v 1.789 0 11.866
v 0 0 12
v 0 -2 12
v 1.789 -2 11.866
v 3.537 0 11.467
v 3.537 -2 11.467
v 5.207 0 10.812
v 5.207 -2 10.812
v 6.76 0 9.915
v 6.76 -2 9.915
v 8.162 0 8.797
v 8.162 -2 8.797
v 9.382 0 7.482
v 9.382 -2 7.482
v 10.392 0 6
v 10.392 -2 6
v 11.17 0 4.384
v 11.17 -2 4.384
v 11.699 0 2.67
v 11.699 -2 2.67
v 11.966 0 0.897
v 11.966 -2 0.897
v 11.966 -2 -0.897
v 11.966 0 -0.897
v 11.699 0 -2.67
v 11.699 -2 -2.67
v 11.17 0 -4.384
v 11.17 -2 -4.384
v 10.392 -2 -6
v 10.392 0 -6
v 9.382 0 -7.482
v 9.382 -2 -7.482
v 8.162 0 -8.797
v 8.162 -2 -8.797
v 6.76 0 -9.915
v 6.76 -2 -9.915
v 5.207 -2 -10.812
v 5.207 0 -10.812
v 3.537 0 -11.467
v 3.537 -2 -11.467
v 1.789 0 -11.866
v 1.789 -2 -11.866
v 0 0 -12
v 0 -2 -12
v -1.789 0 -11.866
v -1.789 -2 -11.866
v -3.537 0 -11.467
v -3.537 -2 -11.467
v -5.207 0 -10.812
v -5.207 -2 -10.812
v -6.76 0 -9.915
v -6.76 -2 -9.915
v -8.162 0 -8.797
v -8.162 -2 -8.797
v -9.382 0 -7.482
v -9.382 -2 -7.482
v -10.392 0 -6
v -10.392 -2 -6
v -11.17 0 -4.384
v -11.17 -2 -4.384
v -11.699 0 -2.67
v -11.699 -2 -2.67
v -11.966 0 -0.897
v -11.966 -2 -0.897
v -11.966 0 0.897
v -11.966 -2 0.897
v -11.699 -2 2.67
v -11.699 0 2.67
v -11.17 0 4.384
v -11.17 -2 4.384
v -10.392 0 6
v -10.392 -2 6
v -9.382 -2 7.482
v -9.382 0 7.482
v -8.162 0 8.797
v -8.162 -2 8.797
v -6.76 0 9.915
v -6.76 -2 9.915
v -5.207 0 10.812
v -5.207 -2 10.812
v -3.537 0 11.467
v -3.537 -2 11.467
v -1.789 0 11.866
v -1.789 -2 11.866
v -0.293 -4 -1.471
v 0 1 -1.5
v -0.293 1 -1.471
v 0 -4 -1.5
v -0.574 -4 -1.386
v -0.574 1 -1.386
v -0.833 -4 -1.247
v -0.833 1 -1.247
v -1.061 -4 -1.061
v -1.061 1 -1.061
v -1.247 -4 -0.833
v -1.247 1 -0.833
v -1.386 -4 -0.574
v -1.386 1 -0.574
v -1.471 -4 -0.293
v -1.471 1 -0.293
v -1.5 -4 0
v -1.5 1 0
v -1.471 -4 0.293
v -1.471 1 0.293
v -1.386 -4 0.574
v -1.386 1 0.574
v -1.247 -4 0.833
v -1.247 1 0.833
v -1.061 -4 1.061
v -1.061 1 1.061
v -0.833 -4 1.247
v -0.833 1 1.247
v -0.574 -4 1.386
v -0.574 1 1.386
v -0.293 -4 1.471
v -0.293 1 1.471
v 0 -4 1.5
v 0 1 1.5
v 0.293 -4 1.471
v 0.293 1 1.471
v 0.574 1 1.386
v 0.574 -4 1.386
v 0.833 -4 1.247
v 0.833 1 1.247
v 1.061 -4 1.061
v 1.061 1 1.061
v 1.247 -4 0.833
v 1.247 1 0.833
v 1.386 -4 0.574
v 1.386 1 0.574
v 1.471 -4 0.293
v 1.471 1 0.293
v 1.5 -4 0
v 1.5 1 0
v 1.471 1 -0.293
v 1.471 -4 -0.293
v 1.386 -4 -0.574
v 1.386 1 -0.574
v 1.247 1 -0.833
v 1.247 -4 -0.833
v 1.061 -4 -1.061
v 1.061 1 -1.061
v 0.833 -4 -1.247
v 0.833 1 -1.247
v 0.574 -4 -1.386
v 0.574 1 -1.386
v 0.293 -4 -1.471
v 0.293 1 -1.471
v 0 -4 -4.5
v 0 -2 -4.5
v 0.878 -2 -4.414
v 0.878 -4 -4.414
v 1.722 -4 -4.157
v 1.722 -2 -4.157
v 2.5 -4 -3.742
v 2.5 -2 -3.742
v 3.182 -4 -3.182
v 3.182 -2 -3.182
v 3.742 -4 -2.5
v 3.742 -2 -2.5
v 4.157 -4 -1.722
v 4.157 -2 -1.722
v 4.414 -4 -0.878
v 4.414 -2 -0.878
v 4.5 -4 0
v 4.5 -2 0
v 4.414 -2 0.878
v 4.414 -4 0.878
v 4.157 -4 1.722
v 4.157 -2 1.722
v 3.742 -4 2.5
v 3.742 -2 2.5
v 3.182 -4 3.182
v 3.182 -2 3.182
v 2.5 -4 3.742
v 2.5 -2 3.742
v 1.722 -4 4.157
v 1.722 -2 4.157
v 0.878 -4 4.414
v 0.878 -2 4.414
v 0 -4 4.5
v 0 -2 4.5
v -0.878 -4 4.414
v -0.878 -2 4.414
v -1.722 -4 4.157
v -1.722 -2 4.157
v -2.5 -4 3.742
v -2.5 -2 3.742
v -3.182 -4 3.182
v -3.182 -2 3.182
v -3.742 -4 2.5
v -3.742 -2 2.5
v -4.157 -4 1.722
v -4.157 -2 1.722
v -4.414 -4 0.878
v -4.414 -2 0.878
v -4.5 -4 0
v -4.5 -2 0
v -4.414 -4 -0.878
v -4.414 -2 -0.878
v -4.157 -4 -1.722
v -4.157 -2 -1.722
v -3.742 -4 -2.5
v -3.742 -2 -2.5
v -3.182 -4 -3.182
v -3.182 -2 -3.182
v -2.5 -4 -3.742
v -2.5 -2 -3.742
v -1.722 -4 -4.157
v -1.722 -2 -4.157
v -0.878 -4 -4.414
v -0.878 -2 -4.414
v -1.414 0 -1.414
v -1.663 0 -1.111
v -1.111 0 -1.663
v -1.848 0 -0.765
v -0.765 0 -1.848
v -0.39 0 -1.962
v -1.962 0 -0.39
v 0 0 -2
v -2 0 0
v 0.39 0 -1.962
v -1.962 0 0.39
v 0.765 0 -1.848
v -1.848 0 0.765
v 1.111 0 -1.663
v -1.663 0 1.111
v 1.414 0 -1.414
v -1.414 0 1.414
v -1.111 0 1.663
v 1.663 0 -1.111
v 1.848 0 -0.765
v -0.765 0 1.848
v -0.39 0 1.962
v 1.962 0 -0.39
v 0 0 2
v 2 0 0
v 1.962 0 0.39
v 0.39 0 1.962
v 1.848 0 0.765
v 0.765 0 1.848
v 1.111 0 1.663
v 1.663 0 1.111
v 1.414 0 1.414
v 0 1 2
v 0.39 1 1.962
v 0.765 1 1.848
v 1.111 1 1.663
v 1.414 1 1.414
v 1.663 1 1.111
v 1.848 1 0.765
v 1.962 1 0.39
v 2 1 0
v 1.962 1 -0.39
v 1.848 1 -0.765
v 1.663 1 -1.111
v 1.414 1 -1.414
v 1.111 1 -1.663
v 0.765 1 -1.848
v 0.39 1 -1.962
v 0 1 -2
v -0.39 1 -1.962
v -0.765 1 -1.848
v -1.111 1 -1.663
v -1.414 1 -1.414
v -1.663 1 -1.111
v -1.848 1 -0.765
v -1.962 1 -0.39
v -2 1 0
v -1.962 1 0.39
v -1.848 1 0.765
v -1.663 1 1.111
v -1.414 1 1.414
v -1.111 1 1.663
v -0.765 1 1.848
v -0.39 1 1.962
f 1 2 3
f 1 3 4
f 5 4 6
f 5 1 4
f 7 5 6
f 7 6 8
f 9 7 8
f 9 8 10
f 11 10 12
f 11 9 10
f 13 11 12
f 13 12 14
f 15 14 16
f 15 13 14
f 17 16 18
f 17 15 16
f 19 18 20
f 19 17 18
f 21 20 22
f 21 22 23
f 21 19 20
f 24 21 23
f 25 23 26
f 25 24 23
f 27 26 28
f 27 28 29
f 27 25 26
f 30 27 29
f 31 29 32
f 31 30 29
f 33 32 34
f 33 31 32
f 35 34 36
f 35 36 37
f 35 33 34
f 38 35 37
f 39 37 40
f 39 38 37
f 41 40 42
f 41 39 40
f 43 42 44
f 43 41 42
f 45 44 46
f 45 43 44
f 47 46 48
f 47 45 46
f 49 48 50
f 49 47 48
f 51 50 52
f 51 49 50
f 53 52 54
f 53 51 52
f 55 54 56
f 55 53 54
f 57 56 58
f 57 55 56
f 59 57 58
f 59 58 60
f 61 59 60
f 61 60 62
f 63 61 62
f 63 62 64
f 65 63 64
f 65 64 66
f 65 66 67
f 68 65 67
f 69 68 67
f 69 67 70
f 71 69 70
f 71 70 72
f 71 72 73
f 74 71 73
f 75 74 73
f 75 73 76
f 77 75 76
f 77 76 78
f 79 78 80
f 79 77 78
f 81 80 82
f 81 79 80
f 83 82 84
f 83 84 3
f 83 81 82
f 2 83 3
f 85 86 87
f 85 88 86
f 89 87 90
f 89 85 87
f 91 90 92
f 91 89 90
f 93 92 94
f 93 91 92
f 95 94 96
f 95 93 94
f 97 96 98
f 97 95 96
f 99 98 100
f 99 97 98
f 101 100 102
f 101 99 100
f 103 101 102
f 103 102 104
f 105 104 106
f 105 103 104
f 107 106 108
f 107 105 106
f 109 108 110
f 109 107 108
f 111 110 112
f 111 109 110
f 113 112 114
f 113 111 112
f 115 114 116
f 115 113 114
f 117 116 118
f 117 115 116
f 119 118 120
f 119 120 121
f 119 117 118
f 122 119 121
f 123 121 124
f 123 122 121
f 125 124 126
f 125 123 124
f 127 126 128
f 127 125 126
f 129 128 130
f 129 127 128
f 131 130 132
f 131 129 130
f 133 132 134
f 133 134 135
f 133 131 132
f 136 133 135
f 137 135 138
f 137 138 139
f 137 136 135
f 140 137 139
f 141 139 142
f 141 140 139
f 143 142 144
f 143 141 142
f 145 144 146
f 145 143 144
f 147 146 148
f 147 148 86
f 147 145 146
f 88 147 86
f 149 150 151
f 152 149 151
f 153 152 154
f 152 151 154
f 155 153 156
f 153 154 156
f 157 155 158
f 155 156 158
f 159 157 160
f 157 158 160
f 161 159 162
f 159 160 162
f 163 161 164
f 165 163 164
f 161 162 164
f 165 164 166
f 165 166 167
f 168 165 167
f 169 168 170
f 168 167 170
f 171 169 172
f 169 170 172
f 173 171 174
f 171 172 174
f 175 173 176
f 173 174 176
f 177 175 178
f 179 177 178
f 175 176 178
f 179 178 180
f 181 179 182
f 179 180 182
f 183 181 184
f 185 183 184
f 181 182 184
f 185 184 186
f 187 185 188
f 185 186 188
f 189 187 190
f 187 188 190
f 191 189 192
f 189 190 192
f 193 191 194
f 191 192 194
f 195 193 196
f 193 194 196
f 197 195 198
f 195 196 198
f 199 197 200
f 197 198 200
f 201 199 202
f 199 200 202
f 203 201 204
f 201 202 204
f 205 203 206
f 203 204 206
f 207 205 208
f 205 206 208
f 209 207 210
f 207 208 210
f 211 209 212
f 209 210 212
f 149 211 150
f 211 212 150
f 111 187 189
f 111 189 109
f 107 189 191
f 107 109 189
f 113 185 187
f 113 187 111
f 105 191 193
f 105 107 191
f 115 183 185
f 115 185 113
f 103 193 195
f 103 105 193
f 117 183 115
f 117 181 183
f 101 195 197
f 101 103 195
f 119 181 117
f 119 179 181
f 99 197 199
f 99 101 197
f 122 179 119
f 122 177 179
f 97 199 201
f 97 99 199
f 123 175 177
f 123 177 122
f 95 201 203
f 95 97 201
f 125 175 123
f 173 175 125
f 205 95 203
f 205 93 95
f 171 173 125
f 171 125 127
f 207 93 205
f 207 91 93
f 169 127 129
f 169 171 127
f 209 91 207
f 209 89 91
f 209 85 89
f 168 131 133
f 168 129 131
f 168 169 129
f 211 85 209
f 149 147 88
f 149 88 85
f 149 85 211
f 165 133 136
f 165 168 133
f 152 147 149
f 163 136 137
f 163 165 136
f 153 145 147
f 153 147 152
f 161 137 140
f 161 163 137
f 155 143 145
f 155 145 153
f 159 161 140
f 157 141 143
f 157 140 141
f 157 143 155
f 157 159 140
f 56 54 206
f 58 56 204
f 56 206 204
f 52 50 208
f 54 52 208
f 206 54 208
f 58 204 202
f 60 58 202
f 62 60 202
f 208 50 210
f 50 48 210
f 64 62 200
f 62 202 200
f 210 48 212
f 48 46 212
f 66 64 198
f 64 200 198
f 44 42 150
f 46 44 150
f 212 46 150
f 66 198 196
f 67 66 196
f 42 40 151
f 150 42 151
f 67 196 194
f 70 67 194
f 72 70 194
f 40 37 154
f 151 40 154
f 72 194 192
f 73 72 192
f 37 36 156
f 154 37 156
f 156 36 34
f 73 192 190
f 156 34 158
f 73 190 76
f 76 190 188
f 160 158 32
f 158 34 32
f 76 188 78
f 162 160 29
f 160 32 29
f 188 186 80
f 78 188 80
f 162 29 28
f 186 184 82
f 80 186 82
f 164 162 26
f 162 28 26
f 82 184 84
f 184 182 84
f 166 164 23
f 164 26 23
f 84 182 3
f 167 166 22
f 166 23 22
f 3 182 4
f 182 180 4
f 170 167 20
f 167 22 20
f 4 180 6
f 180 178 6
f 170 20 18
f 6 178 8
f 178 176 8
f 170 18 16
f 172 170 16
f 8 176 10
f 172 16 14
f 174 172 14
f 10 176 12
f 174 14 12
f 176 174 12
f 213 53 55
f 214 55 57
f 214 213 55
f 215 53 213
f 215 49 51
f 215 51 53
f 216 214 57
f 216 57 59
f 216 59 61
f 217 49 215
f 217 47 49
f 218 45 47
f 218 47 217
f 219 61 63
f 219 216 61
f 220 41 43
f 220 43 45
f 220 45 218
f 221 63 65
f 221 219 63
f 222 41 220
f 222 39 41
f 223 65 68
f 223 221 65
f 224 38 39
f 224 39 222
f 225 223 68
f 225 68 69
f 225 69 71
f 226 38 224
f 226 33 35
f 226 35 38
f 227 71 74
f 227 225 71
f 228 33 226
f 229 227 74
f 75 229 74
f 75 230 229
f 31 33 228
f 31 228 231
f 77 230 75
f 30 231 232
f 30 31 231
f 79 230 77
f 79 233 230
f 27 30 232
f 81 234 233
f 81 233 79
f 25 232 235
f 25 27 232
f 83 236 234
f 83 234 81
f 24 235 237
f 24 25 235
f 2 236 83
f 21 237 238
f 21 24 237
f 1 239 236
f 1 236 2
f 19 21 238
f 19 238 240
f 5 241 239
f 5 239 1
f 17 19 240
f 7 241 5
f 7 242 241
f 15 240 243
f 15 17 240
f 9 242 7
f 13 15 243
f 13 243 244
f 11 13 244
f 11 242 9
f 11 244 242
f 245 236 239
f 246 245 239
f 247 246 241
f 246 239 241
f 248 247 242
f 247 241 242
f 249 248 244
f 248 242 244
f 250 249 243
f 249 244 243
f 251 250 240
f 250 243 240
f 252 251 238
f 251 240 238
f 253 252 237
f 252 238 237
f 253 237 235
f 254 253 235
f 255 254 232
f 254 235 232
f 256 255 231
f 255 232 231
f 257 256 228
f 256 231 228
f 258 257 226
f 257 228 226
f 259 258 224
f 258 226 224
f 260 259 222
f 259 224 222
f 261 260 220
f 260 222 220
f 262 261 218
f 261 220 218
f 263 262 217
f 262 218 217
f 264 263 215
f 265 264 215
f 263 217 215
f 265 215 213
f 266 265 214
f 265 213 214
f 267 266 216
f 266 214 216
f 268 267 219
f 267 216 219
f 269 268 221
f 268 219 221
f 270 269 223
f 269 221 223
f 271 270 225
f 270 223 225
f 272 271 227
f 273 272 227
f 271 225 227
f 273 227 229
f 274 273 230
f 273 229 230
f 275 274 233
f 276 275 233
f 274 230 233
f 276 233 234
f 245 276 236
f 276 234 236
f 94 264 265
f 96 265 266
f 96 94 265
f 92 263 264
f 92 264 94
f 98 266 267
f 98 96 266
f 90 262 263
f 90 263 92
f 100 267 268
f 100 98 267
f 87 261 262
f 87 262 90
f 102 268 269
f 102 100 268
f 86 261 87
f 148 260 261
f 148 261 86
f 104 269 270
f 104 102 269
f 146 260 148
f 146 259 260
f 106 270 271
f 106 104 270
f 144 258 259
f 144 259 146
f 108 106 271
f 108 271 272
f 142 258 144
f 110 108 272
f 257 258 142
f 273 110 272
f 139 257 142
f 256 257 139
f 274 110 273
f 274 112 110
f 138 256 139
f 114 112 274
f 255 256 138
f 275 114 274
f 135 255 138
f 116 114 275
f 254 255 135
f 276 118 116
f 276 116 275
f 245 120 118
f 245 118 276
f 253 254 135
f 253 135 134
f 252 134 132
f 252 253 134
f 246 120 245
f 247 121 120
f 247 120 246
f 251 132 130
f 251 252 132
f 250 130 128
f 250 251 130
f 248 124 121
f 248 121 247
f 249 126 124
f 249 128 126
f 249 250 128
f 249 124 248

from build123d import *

# Parameters (mm, degrees)
SKETCH1_R           = 12
BOSS_EXTRUDE1_DEPTH = 2
SKETCH2_R           = 4.5
BOSS_EXTRUDE2_DEPTH = 2
SKETCH3_R           = 1.5
CUT_EXTRUDE1_DEPTH  = 18.435595774
SKETCH4_R           = 2
SKETCH4_R_2         = 1.5
BOSS_EXTRUDE3_DEPTH = 1


with BuildPart() as part:
    # Sketch1 → Boss-Extrude1 (new body)
    with BuildSketch(Plane(origin=(0, 0, 0), x_dir=(1, 0, 0), z_dir=(0, 1, 0))):
        with Locations(Location((0, 0, 0), (0, 0, 270))):
            Circle(SKETCH1_R)
    extrude(amount=-BOSS_EXTRUDE1_DEPTH)

    # Sketch2 → Boss-Extrude2 (add)
    with BuildSketch(Plane.XZ.offset(2)):
        with Locations(Location((0, 0, 0), (0, 0, 270))):
            Circle(SKETCH2_R)
    extrude(amount=BOSS_EXTRUDE2_DEPTH)

    # Sketch3 → Cut-Extrude1 (cut, through all)
    with BuildSketch(Plane.XZ.offset(4)):
        with Locations(Location((0, 0, 0), (0, 0, 270))):
            Circle(SKETCH3_R)
    extrude(amount=-CUT_EXTRUDE1_DEPTH, mode=Mode.SUBTRACT)

    # Sketch4 → Boss-Extrude3 (add)
    with BuildSketch(Plane(origin=(0, 0, 0), x_dir=(1, 0, 0), z_dir=(0, 1, 0))):
        with Locations(Location((0, 0, 0), (0, 0, 270))):
            Circle(SKETCH4_R)
        with Locations(Location((0, 0, 0), (0, 0, 90))):
            Circle(SKETCH4_R_2, mode=Mode.SUBTRACT)
    extrude(amount=BOSS_EXTRUDE3_DEPTH)


solid = part.part
